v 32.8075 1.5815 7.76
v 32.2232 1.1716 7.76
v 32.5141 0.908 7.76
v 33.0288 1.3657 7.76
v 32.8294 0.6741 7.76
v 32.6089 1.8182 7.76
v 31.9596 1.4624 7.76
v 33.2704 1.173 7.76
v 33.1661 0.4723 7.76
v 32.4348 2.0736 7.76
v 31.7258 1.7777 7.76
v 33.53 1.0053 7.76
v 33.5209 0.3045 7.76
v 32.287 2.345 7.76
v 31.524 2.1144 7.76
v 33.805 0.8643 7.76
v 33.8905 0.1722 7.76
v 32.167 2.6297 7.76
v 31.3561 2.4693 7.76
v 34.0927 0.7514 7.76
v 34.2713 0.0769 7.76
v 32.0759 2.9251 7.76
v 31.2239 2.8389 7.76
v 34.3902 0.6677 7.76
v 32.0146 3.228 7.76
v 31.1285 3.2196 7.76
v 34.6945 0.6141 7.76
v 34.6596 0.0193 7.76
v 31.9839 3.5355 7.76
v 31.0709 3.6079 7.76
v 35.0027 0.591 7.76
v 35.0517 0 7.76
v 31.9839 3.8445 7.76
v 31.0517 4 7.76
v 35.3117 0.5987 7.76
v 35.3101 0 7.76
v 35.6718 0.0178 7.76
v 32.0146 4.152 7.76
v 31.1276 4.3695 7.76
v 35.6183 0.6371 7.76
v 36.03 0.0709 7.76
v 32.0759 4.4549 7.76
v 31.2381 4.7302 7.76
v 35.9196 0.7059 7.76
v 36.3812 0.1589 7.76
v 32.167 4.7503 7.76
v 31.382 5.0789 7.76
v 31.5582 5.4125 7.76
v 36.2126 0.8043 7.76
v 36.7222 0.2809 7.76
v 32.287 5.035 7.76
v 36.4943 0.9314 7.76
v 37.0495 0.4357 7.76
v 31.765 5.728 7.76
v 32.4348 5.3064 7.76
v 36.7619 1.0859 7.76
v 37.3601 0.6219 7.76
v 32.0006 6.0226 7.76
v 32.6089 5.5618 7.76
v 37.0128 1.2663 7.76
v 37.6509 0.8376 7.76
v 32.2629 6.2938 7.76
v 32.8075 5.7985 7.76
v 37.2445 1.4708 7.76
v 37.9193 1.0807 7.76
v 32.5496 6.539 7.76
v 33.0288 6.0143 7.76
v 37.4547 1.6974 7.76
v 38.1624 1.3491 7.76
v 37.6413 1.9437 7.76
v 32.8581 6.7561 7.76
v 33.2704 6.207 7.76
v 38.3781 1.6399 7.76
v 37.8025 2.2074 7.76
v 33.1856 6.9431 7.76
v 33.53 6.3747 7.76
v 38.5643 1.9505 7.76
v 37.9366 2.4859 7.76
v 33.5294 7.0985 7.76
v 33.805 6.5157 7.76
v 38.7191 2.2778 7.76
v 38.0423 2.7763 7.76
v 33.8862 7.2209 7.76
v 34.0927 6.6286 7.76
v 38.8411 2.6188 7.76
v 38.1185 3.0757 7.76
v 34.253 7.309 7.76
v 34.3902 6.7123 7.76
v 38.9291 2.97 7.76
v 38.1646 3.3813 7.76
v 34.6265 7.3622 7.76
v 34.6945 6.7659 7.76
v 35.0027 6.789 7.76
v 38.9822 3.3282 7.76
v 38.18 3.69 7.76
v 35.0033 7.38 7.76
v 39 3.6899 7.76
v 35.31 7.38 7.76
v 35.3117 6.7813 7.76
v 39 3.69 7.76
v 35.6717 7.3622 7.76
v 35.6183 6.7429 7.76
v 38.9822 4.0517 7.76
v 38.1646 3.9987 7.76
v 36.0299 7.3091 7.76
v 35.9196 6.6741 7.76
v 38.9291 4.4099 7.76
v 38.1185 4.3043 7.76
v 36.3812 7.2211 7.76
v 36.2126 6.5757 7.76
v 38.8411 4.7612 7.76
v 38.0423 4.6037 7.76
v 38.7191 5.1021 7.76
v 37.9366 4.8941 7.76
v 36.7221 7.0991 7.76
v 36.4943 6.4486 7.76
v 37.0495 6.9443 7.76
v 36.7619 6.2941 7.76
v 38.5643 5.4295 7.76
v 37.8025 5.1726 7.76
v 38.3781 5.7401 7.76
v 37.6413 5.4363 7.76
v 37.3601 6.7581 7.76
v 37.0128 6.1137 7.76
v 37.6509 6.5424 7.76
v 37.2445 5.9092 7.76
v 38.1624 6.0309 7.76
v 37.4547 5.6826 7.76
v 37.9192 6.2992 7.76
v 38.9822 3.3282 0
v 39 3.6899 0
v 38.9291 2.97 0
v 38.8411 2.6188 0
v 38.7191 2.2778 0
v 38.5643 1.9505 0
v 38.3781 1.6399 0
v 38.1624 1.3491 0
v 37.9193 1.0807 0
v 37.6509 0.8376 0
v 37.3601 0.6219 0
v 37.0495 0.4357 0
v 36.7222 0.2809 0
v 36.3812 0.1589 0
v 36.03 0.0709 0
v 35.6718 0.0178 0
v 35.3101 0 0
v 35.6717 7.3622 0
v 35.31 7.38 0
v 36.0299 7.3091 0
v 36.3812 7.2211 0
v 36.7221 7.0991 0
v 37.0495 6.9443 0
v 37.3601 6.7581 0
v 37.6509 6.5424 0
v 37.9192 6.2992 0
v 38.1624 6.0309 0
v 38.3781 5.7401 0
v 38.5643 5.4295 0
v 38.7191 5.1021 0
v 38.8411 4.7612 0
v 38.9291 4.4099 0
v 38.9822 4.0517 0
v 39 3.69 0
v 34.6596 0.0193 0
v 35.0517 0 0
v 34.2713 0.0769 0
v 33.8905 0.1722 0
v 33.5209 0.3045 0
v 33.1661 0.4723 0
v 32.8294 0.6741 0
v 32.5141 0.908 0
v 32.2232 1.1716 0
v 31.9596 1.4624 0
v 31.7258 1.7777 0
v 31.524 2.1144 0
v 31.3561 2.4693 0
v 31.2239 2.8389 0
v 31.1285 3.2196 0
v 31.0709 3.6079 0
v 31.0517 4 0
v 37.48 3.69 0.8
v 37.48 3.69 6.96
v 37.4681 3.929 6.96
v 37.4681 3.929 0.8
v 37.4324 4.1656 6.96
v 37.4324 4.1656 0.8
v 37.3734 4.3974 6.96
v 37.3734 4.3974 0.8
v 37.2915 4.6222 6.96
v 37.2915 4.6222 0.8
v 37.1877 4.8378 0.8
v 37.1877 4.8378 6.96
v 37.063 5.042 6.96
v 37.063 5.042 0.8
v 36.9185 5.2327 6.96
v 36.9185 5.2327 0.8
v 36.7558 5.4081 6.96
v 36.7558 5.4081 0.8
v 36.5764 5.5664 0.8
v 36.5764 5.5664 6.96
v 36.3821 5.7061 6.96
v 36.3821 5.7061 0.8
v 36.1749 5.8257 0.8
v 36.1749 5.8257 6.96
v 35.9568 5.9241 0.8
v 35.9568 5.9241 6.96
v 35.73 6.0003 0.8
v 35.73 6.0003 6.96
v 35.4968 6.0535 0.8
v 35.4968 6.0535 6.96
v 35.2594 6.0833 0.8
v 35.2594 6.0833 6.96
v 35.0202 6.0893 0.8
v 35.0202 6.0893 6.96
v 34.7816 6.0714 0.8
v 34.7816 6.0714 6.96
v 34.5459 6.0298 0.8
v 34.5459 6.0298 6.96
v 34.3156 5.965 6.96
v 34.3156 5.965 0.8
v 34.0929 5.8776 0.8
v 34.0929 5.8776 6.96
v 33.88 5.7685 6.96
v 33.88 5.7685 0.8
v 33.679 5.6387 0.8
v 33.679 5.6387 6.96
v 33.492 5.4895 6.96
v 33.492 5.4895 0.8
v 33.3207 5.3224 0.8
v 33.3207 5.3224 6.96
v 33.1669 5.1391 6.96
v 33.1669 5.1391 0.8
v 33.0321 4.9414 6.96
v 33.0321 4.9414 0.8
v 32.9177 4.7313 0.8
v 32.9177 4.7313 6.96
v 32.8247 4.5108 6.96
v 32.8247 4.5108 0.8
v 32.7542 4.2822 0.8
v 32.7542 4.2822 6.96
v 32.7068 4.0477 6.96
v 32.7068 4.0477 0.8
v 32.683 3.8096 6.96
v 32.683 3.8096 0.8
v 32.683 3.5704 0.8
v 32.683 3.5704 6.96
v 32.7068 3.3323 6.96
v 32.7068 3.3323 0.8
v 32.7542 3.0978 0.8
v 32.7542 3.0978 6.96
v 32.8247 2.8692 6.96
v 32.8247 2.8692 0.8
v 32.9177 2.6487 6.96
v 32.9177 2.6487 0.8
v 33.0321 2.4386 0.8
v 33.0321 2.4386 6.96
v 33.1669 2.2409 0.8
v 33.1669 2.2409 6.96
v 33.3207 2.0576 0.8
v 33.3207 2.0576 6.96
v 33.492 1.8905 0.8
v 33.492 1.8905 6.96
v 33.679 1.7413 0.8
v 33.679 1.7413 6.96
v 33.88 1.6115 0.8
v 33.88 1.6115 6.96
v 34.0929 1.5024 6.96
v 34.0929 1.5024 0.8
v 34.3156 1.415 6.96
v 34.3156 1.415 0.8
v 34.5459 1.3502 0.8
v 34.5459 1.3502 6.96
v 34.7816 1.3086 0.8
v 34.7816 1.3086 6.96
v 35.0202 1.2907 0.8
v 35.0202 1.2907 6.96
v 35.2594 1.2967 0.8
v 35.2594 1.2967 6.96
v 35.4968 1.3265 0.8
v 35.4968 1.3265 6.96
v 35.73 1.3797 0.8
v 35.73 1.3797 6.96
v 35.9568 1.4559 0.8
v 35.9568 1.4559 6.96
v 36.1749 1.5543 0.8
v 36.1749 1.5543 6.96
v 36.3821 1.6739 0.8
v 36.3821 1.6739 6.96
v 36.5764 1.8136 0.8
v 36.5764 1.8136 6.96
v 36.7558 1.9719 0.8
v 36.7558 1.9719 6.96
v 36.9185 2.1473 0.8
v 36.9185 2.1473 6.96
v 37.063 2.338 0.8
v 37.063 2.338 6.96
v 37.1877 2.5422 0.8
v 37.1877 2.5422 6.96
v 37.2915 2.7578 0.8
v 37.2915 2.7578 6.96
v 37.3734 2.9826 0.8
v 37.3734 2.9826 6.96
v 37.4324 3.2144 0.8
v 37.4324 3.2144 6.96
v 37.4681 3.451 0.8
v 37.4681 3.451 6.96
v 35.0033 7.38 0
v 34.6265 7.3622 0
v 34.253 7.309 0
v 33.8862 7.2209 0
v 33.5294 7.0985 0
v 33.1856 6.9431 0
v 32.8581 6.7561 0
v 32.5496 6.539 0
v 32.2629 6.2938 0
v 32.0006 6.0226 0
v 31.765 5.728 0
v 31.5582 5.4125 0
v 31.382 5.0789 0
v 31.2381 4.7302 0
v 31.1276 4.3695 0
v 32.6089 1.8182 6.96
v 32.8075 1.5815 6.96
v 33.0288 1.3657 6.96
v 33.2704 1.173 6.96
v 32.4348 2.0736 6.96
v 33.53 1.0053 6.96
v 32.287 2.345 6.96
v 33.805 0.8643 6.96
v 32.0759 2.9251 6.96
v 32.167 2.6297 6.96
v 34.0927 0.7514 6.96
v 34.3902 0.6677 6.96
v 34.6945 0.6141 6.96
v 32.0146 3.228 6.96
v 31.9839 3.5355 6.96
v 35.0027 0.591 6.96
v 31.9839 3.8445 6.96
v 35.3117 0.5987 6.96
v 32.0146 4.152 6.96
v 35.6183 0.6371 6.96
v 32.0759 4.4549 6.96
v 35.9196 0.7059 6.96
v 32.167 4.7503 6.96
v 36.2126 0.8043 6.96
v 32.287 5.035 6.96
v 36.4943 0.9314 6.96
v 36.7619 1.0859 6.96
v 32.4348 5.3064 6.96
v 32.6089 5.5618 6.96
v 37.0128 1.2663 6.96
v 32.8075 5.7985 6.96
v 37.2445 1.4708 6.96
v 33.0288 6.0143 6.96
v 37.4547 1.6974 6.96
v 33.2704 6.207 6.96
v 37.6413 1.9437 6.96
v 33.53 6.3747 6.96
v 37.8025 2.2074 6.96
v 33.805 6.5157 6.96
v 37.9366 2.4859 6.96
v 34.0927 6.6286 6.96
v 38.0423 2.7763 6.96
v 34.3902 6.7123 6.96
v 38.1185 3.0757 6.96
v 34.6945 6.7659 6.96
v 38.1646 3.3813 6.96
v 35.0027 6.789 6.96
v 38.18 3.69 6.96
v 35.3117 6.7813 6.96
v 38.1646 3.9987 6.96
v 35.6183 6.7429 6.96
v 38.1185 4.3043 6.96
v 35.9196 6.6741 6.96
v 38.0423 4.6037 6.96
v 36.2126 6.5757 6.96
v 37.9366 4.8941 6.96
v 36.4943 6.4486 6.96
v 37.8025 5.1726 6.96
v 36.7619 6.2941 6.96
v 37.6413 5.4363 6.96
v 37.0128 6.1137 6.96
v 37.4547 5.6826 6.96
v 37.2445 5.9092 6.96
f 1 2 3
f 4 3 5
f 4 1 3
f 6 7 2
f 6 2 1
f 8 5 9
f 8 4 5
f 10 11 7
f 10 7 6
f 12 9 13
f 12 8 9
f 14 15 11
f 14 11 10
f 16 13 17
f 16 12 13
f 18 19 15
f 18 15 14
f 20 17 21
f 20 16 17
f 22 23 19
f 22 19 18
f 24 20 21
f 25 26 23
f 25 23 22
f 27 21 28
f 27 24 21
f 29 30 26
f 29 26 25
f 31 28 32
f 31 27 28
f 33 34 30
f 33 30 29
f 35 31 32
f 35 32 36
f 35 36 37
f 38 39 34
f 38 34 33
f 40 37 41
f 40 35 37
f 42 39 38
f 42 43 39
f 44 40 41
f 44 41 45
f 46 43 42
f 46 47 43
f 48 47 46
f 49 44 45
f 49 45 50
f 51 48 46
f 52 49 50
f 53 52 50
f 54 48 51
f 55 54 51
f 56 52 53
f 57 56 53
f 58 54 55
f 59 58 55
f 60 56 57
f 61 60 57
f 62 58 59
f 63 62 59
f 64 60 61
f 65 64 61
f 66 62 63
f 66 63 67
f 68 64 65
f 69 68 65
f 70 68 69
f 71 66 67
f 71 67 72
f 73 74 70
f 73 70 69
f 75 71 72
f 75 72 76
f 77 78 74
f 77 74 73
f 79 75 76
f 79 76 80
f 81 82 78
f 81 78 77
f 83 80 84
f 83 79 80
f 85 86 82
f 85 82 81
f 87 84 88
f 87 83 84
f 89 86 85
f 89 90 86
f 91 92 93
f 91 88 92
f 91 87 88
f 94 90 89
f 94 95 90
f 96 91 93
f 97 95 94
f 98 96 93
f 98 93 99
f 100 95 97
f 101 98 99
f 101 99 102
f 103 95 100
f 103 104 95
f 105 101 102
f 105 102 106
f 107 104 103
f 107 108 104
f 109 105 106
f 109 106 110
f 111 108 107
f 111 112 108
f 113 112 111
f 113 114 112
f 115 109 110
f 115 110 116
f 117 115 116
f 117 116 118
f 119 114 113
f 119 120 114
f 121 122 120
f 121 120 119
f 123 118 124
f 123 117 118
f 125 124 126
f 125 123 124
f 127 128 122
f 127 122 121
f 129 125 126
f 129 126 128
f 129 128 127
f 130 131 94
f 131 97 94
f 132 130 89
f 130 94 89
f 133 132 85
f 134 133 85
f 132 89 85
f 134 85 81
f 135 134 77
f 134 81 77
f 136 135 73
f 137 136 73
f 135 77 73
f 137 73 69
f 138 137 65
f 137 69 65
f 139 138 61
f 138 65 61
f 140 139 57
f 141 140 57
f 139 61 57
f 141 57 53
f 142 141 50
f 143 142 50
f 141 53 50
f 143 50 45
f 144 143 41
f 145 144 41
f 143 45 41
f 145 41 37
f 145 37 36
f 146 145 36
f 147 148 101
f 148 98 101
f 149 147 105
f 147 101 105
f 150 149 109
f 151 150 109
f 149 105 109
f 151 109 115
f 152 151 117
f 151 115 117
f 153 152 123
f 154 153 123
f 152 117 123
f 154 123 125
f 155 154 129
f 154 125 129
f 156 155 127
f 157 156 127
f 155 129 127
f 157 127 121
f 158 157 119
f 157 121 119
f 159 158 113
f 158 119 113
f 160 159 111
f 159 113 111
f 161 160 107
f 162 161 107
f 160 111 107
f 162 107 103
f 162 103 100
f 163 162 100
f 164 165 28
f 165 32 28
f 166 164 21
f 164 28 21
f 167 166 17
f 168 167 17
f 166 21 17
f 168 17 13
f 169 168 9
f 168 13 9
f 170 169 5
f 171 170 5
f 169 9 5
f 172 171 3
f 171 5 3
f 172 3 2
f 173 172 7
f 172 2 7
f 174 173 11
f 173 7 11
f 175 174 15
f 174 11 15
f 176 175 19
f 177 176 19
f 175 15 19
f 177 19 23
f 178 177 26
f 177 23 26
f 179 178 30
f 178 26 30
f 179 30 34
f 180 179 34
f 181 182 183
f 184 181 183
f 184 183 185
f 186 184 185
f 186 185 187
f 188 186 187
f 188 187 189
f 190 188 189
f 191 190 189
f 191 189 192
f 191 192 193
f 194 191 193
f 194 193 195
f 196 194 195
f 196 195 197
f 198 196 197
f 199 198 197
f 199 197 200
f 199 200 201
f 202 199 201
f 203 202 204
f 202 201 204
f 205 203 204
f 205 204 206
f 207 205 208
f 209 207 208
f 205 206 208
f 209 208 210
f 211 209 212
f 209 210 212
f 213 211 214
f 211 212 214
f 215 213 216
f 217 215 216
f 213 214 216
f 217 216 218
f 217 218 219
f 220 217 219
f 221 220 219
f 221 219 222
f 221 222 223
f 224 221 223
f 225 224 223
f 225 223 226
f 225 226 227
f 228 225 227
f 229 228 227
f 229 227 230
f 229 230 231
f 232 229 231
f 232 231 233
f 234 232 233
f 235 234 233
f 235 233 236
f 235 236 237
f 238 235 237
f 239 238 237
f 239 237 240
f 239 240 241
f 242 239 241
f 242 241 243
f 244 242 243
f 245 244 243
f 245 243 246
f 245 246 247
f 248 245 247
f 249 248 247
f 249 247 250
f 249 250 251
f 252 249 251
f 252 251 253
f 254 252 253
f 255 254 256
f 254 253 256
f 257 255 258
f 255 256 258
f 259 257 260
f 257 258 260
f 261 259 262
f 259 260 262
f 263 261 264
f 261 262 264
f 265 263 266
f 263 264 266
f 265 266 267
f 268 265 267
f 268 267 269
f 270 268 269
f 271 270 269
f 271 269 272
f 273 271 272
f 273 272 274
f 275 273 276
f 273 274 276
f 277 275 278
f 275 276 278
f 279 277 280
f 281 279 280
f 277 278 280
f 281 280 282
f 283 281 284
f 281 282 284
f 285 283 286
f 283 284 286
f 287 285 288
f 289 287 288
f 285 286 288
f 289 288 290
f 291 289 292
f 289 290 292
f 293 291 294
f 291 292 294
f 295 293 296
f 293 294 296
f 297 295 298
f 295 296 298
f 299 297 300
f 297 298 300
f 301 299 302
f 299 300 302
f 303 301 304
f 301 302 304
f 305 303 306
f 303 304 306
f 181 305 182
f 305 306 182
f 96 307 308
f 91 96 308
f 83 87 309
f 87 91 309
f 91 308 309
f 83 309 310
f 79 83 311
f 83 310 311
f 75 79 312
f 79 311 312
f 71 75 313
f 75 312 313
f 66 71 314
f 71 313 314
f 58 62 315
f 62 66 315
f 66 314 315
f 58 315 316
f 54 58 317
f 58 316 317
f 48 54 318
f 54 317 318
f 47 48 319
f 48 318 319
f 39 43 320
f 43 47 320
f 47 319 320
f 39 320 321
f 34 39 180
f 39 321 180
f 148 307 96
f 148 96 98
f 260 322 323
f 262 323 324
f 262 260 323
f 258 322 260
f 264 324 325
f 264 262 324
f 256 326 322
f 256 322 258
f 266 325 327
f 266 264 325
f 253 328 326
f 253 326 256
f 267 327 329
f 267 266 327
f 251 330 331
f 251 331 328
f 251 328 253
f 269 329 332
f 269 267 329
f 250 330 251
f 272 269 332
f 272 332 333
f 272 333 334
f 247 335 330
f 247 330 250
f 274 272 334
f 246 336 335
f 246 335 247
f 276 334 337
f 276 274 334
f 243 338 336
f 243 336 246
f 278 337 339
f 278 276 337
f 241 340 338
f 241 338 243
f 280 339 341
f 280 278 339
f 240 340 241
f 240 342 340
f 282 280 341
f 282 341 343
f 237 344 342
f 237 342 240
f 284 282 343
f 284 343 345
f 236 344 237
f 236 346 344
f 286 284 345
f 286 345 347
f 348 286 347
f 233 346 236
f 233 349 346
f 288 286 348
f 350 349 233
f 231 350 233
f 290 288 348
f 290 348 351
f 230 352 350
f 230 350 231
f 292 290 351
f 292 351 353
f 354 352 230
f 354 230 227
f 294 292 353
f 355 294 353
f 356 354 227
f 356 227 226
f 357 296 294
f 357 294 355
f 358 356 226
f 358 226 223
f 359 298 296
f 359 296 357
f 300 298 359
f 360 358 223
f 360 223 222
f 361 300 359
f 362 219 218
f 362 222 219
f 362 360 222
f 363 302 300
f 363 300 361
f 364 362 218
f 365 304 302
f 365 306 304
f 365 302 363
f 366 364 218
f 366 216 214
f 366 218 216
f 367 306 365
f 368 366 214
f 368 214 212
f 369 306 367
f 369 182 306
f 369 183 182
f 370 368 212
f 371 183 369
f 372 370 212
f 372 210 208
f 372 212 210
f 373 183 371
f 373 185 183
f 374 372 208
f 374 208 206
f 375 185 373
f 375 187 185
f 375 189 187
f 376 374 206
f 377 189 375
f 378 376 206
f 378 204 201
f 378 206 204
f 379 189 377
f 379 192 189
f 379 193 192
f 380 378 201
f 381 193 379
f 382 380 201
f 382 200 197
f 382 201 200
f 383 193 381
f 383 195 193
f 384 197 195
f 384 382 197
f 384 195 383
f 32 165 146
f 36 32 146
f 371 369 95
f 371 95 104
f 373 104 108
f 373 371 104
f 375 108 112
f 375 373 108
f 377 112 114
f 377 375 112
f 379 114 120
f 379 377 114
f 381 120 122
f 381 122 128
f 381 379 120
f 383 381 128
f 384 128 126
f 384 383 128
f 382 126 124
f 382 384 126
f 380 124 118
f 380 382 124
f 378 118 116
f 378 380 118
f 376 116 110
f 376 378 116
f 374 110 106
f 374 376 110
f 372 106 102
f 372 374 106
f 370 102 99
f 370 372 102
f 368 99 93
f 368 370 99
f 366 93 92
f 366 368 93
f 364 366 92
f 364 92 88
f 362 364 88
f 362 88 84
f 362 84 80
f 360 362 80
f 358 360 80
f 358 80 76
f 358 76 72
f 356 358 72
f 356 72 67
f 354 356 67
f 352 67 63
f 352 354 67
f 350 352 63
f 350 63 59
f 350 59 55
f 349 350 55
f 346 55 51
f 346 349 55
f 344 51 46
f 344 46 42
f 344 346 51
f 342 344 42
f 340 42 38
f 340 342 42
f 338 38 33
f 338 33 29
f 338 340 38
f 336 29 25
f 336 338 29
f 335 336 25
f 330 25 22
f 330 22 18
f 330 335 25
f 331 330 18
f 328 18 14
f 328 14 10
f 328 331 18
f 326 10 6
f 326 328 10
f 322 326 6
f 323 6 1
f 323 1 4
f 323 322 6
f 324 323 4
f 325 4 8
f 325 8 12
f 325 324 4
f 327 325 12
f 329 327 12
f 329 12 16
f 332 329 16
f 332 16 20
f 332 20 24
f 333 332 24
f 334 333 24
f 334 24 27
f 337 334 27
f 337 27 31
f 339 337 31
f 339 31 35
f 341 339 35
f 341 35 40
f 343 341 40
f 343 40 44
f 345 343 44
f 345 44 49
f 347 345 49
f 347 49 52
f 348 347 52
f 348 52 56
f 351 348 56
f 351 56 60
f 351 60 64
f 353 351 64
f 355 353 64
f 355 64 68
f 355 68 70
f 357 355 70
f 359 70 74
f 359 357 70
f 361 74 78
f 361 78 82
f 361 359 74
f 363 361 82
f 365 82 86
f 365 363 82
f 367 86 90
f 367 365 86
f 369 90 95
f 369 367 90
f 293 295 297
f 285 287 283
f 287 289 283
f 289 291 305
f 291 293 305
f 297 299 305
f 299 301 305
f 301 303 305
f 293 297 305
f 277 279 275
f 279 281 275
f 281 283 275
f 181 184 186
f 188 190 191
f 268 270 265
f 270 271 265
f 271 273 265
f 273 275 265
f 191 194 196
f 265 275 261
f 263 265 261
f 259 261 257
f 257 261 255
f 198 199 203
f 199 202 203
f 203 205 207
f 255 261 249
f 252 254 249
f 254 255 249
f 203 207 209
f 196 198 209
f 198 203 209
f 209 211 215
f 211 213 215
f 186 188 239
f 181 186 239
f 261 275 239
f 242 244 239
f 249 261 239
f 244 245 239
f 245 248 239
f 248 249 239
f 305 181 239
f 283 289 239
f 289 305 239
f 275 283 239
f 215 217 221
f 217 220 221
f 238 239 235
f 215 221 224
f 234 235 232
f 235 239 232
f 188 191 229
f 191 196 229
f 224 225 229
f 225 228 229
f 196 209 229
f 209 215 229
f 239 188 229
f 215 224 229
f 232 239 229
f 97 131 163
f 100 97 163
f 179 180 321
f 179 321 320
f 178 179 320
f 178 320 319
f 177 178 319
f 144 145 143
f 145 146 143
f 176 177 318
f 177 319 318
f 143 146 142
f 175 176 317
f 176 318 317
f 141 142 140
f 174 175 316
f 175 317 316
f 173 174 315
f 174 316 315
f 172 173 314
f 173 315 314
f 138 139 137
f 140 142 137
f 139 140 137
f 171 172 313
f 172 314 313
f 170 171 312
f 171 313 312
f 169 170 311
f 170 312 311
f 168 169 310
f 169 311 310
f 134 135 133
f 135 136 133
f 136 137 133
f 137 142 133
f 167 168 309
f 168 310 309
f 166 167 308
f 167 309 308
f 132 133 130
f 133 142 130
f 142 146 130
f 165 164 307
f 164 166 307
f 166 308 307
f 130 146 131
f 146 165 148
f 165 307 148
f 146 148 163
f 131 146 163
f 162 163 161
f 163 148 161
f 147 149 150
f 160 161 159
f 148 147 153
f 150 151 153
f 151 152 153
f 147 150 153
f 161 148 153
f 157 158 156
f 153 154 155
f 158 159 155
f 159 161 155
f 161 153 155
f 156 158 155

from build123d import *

# Parameters (mm, degrees)
SKETCH1_W                = 39
SKETCH1_H                = 7.38
BOSS_EXTRUDE1_DEPTH      = 7.76
SKETCH2_R                = 2.4
CUT_EXTRUDE1_DEPTH       = 7.76
CUT_EXTRUDE2_OUTLINE_R   = 3.1
CUT_EXTRUDE2_OUTLINE_R_2 = 2.4
CUT_EXTRUDE2_DEPTH       = 0.8
CUT_EXTRUDE3_START       = 6.96
CUT_EXTRUDE3_OUTLINE_R   = 3.1
CUT_EXTRUDE3_OUTLINE_R_2 = 2.4
CUT_EXTRUDE3_DEPTH       = 0.8
LPATTERN3_COUNT          = 3
LPATTERN3_PITCH          = 7.79
LPATTERN6_COUNT          = 3
LPATTERN6_PITCH          = 7.79
FILLET1_R                = 3.69
FILLET2_R                = 3.69
FILLET3_R                = 3.69
FILLET4_R                = 3.69
SKETCH4_W                = 32.047846992
SKETCH4_H                = 7.400170021
CUT_EXTRUDE4_DEPTH       = 10
FILLET6_R                = 4
FILLET7_R                = 4
BOSS_EXTRUDE2_START      = -0.8
BOSS_EXTRUDE2_OUTLINE_R  = 3.1
BOSS_EXTRUDE2_DEPTH      = 0.8


with BuildPart() as part:
    # Sketch1 → Boss-Extrude1 (new body)
    with BuildSketch(Plane.XY):
        with Locations((19.5, 3.69)):
            Rectangle(SKETCH1_W, SKETCH1_H)
    extrude(amount=BOSS_EXTRUDE1_DEPTH)

    # Sketch2 → Cut-Extrude1 (cut)
    with BuildSketch(Plane.XY.offset(7.76)):
        with Locations((19.5, 3.69)):
            Circle(SKETCH2_R)
    cut_extrude1 = extrude(amount=-CUT_EXTRUDE1_DEPTH, mode=Mode.SUBTRACT)

    # Cut-Extrude2: read off the stored shape, not the designer's step
    # Cut-Extrude2 outline → Cut-Extrude2 (cut)
    with BuildSketch(Plane.XY):
        with Locations((19.5, 3.69)):
            Circle(CUT_EXTRUDE2_OUTLINE_R)
        with Locations((19.5, 3.69)):
            Circle(CUT_EXTRUDE2_OUTLINE_R_2, mode=Mode.SUBTRACT)
    cut_extrude2 = extrude(amount=CUT_EXTRUDE2_DEPTH, mode=Mode.SUBTRACT)

    # Cut-Extrude3: read off the stored shape, not the designer's step
    # Cut-Extrude3 outline → Cut-Extrude3 (cut)
    with BuildSketch(Plane.XY.offset(CUT_EXTRUDE3_START)):
        with Locations((19.5, 3.69)):
            Circle(CUT_EXTRUDE3_OUTLINE_R)
        with Locations((19.5, 3.69)):
            Circle(CUT_EXTRUDE3_OUTLINE_R_2, mode=Mode.SUBTRACT)
    cut_extrude3 = extrude(amount=CUT_EXTRUDE3_DEPTH, mode=Mode.SUBTRACT)

    # LPattern3: Cut-Extrude1, Cut-Extrude2, Cut-Extrude3 ×3
    with Locations(*[(-i * LPATTERN3_PITCH, 0, 0) for i in range(1, LPATTERN3_COUNT)]):
        add(cut_extrude1, mode=Mode.SUBTRACT)
        add(cut_extrude2, mode=Mode.SUBTRACT)
        add(cut_extrude3, mode=Mode.SUBTRACT)

    # LPattern6: Cut-Extrude1, Cut-Extrude2, Cut-Extrude3 ×3
    with Locations(*[(i * LPATTERN6_PITCH, 0, 0) for i in range(1, LPATTERN6_COUNT)]):
        add(cut_extrude1, mode=Mode.SUBTRACT)
        add(cut_extrude2, mode=Mode.SUBTRACT)
        add(cut_extrude3, mode=Mode.SUBTRACT)

    # Fillet1
    fillet1_edges = [part.edges().sort_by_distance(p)[0] for p in [
        (0, 7.38, 3.88),
    ]]
    fillet(fillet1_edges, radius=FILLET1_R)

    # Fillet2
    fillet2_edges = [part.edges().sort_by_distance(p)[0] for p in [
        (0, 0, 3.88),
    ]]
    fillet(fillet2_edges, radius=FILLET2_R - 0.0001)  # a hair under: the kernel refuses the full size

    # Fillet3
    fillet3_edges = [part.edges().sort_by_distance(p)[0] for p in [
        (39, 7.38, 3.88),
    ]]
    fillet(fillet3_edges, radius=FILLET3_R)

    # Fillet4
    fillet4_edges = [part.edges().sort_by_distance(p)[0] for p in [
        (39, 0, 3.88),
    ]]
    fillet(fillet4_edges, radius=FILLET4_R - 0.0001)  # a hair under: the kernel refuses the full size

    # Sketch4 → Cut-Extrude4 (cut)
    with BuildSketch(Plane(origin=(0, 0, 0), x_dir=(-1, 0, 0), z_dir=(0, 0, -1))):
        with Locations((-15.027741002, 3.700085011)):
            Rectangle(SKETCH4_W, SKETCH4_H)
    extrude(amount=-CUT_EXTRUDE4_DEPTH, mode=Mode.SUBTRACT)

    # Fillet6
    fillet6_edges = [part.edges().sort_by_distance(p)[0] for p in [
        (31.051664498, 0, 3.88),
    ]]
    fillet(fillet6_edges, radius=FILLET6_R)

    # Fillet7
    # the kernel refuses this fillet: 4 mm, written as the material it takes off along each edge
    with BuildSketch(Plane(origin=(31.051664498, 7.38, -9.8791447), x_dir=(0, -1, 0), z_dir=(0, 0, 1))) as fillet7_piece_1:
        with BuildLine():
            CenterArc((4, 3.95165788), FILLET7_R, 180, 81.083203747)
            Line((0, 3.95165788), (-0.08, 3.95165788))
            Line((-0.08, 3.95165788), (-0.08, 0))
            Line((-0.08, 0), (0, -0.08))
            ThreePointArc((0, -0.08), (1.69, -0.08), (3.3676, -0.079033158))
            Line((3.3676, -0.079033158), (3.38, 0))
        make_face()
    extrude(amount=27.5182894, mode=Mode.SUBTRACT)

    # Boss-Extrude2: read off the stored shape, not the designer's step
    # Boss-Extrude2 outline → Boss-Extrude2 (add)
    with BuildSketch(Plane(origin=(0, 0, 0), x_dir=(-1, 0, 0), z_dir=(0, 0, -1)).offset(BOSS_EXTRUDE2_START)):
        with Locations((-35.08, 3.69)):
            Circle(BOSS_EXTRUDE2_OUTLINE_R)
    extrude(amount=BOSS_EXTRUDE2_DEPTH)


solid = part.part
